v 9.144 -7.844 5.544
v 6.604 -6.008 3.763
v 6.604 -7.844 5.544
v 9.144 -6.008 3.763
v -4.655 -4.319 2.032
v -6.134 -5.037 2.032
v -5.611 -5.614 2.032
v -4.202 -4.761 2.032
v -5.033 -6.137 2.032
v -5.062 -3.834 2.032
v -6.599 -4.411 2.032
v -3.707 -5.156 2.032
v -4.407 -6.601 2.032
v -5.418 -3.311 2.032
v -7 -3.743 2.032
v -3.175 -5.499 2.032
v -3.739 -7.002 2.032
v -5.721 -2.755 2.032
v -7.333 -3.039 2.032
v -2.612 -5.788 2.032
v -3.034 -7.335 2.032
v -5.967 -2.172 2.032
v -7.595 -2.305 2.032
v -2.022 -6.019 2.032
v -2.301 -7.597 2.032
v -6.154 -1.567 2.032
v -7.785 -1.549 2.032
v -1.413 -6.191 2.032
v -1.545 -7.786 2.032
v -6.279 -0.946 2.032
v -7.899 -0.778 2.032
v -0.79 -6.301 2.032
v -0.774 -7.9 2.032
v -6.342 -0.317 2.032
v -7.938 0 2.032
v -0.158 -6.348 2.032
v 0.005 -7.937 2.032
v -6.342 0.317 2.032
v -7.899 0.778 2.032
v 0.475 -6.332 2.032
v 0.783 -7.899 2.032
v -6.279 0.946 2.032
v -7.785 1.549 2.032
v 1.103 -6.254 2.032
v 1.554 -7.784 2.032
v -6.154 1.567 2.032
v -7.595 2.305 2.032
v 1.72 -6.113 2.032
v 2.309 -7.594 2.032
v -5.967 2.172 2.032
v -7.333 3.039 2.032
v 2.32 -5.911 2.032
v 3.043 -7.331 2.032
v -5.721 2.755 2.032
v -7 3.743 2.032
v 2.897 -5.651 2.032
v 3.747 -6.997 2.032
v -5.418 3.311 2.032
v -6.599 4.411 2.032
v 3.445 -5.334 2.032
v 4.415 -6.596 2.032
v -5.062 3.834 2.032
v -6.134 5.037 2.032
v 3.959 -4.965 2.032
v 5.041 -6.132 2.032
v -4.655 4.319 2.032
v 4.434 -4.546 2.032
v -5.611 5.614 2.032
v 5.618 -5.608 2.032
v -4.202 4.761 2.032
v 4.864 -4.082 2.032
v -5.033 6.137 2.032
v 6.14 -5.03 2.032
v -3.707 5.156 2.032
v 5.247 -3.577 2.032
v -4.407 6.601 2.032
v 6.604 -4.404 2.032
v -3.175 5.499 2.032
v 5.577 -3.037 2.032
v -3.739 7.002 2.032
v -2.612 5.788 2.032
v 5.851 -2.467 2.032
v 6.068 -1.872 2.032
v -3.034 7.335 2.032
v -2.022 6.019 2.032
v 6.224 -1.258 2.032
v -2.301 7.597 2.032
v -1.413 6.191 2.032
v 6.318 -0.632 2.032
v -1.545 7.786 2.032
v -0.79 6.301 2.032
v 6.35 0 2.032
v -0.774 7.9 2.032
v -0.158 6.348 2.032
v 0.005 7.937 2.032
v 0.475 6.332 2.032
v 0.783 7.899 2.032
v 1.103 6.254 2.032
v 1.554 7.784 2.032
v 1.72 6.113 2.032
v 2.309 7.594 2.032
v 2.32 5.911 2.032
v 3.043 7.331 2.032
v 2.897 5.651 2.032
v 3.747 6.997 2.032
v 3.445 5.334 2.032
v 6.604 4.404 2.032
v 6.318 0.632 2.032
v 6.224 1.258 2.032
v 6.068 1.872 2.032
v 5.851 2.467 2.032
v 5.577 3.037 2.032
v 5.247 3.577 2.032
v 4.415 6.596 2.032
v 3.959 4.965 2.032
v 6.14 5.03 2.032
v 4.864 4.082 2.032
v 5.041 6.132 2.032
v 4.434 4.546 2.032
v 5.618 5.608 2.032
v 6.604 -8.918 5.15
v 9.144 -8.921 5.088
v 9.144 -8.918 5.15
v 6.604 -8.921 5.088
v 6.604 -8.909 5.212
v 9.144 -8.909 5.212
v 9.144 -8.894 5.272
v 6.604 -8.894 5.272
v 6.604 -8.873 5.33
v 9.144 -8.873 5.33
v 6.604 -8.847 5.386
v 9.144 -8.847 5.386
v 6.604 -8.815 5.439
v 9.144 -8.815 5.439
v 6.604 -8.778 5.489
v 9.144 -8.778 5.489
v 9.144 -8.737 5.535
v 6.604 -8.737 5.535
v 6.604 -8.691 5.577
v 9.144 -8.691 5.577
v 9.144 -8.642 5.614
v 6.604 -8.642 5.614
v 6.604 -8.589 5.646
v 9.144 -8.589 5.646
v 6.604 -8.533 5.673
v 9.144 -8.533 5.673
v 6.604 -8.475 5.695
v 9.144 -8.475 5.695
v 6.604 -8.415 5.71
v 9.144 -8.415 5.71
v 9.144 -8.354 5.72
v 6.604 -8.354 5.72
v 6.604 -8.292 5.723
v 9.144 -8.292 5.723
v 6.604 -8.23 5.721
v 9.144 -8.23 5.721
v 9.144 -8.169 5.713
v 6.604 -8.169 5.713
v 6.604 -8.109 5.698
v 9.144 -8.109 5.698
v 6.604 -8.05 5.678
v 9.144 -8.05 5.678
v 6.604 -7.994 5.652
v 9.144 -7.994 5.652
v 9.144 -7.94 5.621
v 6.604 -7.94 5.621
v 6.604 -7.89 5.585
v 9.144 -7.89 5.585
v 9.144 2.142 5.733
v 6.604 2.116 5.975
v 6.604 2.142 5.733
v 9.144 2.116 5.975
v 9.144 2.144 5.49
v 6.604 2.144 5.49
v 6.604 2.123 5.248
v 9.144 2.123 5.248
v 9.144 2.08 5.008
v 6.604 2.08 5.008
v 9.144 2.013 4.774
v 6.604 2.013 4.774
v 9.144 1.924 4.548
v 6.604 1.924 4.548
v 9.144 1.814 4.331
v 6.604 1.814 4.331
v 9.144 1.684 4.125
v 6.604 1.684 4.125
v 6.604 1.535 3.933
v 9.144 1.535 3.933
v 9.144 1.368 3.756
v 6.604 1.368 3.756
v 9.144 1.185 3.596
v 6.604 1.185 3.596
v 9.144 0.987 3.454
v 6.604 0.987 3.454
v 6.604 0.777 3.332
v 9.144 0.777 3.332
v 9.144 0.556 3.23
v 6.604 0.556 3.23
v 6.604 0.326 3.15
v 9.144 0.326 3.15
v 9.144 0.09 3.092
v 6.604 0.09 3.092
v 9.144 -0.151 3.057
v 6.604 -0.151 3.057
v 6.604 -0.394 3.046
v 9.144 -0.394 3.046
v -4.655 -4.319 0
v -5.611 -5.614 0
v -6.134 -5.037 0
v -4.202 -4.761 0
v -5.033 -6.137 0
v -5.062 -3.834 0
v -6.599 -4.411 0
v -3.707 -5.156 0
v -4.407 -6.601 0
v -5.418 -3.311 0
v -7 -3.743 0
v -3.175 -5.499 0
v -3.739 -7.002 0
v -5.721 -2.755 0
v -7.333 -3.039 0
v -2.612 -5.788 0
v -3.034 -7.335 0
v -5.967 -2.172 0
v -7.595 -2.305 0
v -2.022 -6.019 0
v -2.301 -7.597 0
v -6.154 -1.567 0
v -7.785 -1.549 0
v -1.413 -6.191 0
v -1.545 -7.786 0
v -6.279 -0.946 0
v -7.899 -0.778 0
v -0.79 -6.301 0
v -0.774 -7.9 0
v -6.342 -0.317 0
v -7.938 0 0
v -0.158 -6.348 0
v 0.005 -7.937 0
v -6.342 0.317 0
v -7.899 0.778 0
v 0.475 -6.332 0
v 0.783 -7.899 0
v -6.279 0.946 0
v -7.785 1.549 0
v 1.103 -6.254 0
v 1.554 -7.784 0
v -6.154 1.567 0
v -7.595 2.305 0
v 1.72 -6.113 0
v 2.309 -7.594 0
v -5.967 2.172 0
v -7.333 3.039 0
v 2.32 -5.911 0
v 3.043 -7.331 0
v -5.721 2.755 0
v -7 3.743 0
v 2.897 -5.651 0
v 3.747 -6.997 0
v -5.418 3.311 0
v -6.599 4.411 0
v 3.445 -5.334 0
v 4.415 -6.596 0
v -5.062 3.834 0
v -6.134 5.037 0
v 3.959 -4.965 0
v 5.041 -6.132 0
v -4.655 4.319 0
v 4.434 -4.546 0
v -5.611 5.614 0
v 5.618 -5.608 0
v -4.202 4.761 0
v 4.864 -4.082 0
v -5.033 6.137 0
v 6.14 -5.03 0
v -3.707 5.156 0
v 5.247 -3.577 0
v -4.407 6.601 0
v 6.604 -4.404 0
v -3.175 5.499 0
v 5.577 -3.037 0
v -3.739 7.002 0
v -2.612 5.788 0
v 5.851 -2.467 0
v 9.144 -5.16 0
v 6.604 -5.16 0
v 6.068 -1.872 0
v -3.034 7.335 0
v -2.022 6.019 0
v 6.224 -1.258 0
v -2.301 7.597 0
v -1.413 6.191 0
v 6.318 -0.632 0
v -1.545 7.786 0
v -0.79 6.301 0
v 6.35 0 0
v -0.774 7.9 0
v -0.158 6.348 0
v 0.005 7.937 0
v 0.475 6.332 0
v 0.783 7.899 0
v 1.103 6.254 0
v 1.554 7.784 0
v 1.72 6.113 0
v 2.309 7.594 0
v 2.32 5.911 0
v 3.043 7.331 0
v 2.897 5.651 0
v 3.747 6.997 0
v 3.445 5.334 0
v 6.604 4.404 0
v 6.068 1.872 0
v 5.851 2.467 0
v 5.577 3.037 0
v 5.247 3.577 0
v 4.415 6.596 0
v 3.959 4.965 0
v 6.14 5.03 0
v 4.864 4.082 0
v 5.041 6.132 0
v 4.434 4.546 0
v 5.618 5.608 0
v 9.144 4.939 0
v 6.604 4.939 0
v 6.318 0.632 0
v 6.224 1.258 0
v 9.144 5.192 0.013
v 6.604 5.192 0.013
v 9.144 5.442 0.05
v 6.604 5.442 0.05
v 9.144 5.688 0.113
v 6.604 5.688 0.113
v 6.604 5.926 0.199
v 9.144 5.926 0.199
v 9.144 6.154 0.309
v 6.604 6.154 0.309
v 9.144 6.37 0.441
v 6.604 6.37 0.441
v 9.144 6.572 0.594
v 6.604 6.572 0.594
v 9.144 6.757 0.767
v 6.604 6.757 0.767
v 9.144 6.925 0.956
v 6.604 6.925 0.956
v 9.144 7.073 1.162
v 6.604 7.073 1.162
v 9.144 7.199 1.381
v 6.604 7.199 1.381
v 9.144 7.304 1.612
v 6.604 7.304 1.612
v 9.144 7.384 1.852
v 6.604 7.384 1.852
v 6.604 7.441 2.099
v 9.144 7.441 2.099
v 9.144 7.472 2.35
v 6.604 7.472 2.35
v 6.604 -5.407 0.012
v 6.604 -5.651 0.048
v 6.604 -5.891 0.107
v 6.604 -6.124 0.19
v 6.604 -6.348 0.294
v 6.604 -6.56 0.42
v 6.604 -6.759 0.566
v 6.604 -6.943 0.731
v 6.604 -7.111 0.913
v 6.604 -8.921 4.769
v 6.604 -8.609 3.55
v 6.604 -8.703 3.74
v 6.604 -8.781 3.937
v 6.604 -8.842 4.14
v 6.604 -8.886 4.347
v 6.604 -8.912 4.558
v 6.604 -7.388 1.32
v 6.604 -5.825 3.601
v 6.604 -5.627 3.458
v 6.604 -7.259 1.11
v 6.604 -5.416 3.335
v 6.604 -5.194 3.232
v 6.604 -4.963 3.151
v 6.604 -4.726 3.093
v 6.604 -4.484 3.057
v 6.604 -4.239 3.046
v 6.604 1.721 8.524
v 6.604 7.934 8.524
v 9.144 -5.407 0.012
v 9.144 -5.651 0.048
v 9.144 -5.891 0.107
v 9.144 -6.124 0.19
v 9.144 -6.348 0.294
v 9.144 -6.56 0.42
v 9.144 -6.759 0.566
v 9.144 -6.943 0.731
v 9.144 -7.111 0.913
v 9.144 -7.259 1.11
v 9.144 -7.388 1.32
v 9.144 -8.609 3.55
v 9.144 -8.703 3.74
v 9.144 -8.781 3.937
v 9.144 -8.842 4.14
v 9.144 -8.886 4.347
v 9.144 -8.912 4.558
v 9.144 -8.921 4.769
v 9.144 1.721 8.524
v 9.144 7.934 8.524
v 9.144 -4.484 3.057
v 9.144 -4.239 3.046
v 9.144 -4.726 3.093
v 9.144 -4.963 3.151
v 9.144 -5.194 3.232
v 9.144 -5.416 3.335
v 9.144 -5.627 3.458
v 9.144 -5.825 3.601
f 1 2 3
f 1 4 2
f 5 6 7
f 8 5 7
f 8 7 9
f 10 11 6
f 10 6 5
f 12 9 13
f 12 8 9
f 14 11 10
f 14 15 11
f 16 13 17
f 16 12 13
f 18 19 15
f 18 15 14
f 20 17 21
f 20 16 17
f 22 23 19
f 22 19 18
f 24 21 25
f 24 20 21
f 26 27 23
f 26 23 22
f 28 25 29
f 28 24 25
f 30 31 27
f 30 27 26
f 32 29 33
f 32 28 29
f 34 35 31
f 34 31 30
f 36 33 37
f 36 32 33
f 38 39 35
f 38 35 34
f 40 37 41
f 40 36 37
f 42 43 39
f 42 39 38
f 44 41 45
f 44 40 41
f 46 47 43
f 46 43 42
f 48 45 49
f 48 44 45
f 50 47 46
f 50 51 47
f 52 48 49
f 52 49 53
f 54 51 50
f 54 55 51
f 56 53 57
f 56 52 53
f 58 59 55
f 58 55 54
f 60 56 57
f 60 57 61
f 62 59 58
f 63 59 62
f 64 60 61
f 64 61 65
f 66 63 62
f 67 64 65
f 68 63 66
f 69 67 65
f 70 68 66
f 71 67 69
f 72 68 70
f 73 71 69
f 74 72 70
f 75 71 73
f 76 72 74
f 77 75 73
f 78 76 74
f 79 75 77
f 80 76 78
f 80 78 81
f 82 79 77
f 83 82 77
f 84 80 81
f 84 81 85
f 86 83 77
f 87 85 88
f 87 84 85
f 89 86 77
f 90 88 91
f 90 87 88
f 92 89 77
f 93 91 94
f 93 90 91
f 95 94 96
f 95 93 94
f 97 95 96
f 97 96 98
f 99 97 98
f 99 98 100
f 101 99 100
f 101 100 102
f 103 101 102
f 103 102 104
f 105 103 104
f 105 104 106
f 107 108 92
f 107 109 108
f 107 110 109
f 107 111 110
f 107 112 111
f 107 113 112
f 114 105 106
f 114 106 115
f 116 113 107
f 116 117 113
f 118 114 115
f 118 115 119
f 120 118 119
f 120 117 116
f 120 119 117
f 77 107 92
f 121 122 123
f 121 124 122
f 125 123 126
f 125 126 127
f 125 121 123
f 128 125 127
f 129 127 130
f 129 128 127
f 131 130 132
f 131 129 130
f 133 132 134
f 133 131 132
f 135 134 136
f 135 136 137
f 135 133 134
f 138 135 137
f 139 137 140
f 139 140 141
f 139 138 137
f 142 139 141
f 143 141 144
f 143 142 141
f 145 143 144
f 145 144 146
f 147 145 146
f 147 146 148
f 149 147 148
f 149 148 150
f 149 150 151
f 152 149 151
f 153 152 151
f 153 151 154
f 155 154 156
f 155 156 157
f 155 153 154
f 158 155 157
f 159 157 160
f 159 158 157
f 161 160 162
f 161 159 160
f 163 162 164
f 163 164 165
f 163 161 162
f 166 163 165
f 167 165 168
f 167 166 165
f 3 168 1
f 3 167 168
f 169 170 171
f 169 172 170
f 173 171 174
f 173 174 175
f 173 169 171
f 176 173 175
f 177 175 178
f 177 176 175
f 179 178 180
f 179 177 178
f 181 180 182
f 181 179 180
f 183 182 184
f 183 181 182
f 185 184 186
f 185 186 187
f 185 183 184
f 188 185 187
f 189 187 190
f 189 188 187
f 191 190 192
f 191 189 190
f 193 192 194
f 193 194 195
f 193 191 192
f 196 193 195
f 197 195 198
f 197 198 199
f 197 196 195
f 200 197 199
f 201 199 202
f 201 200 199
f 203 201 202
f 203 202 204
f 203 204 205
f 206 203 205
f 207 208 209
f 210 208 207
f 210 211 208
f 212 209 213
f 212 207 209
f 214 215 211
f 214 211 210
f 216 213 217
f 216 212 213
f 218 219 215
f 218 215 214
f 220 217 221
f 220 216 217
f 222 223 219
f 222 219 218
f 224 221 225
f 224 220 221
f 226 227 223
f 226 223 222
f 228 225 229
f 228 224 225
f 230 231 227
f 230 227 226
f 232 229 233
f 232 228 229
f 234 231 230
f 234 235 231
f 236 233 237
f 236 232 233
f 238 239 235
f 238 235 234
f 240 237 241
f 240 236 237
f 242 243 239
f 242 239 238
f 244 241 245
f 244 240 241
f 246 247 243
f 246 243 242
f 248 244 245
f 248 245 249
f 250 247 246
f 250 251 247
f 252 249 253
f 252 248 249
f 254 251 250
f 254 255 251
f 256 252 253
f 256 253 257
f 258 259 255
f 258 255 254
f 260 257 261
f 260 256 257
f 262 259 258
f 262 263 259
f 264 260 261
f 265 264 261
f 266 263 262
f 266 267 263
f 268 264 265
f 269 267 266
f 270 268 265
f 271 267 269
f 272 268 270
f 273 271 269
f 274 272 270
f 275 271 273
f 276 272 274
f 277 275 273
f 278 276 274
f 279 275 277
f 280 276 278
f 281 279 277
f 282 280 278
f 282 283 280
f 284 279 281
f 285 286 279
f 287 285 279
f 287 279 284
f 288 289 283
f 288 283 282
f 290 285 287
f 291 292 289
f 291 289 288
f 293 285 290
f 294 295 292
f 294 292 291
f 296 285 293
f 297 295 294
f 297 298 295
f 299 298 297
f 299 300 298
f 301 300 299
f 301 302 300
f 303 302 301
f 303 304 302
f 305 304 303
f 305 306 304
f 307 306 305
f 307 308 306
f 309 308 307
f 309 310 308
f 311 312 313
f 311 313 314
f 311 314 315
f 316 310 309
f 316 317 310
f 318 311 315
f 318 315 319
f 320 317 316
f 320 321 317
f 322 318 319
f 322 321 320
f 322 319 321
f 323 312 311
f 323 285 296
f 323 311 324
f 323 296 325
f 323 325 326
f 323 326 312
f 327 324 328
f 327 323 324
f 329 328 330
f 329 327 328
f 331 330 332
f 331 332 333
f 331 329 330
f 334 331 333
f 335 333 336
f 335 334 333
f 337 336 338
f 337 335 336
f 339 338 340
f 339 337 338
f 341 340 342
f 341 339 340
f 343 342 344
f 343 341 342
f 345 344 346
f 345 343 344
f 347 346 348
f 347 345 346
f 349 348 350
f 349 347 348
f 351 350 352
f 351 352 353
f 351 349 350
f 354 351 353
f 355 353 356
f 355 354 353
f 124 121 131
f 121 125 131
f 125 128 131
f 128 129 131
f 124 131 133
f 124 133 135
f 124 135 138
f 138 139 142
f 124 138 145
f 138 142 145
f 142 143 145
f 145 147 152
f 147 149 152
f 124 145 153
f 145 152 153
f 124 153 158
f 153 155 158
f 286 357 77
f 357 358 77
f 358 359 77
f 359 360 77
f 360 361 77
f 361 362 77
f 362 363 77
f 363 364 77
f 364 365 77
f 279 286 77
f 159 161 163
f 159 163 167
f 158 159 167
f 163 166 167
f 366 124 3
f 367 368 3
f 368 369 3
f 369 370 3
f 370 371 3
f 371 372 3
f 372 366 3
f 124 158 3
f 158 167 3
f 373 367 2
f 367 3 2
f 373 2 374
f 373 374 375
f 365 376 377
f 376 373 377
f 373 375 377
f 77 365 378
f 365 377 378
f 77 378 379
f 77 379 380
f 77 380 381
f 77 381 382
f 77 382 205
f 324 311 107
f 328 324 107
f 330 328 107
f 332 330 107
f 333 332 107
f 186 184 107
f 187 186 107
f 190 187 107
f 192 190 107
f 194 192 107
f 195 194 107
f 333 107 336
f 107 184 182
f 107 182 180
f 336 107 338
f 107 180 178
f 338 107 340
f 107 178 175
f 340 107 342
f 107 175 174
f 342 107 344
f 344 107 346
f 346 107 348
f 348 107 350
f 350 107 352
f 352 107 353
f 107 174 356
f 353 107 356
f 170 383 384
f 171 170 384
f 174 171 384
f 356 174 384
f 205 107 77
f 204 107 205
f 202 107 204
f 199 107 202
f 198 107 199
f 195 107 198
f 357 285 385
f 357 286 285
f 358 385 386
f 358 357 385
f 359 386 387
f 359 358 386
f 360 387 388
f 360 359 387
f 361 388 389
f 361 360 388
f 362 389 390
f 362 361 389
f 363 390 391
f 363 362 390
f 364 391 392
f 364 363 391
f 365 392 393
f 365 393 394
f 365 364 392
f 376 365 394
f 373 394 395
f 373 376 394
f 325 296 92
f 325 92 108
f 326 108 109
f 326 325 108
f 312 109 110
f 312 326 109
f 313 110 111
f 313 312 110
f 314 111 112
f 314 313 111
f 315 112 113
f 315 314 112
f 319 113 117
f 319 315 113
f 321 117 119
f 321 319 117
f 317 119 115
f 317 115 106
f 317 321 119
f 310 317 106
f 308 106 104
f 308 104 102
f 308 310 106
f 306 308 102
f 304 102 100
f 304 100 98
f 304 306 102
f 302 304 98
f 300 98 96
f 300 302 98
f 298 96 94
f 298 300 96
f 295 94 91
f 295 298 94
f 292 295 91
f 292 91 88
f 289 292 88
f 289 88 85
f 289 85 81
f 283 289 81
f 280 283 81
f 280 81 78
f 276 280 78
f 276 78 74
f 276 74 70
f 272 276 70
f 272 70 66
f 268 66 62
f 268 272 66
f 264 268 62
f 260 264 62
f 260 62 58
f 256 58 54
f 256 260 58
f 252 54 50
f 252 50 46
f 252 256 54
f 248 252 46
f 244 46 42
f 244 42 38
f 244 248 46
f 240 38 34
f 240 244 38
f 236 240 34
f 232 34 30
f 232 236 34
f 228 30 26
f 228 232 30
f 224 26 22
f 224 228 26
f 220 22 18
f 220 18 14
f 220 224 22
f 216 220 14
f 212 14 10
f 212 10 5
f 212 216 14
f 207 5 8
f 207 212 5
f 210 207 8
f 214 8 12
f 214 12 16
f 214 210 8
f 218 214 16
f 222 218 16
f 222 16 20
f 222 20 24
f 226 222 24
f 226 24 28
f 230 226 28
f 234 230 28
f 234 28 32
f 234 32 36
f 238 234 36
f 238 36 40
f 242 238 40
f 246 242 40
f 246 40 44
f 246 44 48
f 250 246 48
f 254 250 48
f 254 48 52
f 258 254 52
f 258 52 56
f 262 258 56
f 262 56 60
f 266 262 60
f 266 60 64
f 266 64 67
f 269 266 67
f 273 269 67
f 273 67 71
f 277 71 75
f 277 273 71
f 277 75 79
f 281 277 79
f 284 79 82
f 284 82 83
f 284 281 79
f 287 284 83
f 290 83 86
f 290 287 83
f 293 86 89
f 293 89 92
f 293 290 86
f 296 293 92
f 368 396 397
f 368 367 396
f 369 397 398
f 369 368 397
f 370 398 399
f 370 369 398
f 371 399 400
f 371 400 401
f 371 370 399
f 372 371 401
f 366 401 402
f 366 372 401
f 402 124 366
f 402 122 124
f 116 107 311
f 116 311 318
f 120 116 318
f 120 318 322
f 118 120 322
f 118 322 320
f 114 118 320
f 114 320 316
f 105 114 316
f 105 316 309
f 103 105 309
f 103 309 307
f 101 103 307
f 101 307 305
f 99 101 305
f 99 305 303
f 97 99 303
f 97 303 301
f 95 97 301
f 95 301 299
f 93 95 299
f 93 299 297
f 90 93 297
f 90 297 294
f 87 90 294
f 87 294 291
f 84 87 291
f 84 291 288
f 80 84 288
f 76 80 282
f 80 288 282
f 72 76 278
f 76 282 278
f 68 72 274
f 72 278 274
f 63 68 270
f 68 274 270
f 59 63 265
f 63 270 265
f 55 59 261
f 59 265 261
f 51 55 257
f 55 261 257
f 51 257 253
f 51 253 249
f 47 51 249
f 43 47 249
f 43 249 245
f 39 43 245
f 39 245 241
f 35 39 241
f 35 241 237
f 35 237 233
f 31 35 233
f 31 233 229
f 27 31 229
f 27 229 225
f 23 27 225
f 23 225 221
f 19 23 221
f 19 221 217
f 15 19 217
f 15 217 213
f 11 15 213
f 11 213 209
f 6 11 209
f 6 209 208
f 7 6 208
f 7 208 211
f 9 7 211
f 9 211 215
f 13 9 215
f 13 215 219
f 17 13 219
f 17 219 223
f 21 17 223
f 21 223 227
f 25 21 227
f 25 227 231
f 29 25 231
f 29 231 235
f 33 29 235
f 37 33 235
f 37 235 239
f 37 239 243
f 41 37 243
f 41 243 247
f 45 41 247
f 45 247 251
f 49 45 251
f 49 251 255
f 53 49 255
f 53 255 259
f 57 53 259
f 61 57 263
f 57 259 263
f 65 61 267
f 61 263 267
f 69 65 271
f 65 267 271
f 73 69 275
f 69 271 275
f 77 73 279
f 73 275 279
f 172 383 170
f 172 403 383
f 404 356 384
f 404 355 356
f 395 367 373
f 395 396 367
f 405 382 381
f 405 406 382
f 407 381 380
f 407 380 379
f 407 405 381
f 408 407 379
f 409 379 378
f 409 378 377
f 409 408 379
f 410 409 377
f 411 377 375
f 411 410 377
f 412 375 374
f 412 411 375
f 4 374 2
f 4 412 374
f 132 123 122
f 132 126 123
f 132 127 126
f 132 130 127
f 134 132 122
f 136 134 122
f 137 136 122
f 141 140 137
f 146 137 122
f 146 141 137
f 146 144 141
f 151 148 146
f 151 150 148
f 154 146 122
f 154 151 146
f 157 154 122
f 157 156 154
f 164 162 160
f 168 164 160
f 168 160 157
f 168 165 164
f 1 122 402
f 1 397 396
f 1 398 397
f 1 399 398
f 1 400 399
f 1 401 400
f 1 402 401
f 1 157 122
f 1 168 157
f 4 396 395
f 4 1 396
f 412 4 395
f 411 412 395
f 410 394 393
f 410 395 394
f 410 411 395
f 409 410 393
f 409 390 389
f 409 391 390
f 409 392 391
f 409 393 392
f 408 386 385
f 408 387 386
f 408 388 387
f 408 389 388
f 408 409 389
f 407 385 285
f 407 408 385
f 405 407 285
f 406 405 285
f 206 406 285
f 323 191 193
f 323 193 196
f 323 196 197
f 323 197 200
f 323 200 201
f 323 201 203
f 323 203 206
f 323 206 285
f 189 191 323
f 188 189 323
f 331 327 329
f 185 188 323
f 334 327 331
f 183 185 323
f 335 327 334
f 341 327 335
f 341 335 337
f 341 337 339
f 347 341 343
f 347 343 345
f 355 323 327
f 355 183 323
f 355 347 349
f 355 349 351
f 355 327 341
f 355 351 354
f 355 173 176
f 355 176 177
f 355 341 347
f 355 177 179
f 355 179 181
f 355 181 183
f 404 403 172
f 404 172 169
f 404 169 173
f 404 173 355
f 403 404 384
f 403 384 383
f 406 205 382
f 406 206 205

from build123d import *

# Parameters (mm, degrees)
F0_R     = 7.9375
F0_R_2   = 6.35
F1_DEPTH = 2.032
F4_DEPTH = 1.27
F5_R     = 2.54
F6_R     = 0.635


with BuildPart() as f1:
    # F0 (on Top) → F1 (new body)
    with BuildSketch(Plane.XY):
        Circle(F0_R)
        Circle(F0_R_2, mode=Mode.SUBTRACT)
    extrude(amount=F1_DEPTH)

    # F3 (on offset) → F4 (join, symmetric)
    with BuildSketch(Plane.YZ.offset(7.874)):
        Polygon((-6.665544, 0), (7.295991, 0), (7.934471, 8.52365), (1.720515, 8.52365), (2.570548, 3.045656), (-5.269391, 3.045656), (-8.920868, 6.589739), (-8.920868, 4.119621), align=None)
    extrude(amount=F4_DEPTH, both=True)

    # F5
    f5_edges = [f1.edges().sort_by_distance(p)[0] for p in [
        (7.874, 2.570548, 3.045656),
        (7.874, -5.269391, 3.045656),
        (7.874, 7.295991, 0),
        (7.874, -6.665544, 0),
        (7.874, -8.920868, 4.119621),
    ]]
    fillet(f5_edges, radius=F5_R)

    # F6
    f6_edges = [f1.edges().sort_by_distance(p)[0] for p in [
        (7.874, -8.920868, 6.589739),
    ]]
    fillet(f6_edges, radius=F6_R)


solid = f1.part
